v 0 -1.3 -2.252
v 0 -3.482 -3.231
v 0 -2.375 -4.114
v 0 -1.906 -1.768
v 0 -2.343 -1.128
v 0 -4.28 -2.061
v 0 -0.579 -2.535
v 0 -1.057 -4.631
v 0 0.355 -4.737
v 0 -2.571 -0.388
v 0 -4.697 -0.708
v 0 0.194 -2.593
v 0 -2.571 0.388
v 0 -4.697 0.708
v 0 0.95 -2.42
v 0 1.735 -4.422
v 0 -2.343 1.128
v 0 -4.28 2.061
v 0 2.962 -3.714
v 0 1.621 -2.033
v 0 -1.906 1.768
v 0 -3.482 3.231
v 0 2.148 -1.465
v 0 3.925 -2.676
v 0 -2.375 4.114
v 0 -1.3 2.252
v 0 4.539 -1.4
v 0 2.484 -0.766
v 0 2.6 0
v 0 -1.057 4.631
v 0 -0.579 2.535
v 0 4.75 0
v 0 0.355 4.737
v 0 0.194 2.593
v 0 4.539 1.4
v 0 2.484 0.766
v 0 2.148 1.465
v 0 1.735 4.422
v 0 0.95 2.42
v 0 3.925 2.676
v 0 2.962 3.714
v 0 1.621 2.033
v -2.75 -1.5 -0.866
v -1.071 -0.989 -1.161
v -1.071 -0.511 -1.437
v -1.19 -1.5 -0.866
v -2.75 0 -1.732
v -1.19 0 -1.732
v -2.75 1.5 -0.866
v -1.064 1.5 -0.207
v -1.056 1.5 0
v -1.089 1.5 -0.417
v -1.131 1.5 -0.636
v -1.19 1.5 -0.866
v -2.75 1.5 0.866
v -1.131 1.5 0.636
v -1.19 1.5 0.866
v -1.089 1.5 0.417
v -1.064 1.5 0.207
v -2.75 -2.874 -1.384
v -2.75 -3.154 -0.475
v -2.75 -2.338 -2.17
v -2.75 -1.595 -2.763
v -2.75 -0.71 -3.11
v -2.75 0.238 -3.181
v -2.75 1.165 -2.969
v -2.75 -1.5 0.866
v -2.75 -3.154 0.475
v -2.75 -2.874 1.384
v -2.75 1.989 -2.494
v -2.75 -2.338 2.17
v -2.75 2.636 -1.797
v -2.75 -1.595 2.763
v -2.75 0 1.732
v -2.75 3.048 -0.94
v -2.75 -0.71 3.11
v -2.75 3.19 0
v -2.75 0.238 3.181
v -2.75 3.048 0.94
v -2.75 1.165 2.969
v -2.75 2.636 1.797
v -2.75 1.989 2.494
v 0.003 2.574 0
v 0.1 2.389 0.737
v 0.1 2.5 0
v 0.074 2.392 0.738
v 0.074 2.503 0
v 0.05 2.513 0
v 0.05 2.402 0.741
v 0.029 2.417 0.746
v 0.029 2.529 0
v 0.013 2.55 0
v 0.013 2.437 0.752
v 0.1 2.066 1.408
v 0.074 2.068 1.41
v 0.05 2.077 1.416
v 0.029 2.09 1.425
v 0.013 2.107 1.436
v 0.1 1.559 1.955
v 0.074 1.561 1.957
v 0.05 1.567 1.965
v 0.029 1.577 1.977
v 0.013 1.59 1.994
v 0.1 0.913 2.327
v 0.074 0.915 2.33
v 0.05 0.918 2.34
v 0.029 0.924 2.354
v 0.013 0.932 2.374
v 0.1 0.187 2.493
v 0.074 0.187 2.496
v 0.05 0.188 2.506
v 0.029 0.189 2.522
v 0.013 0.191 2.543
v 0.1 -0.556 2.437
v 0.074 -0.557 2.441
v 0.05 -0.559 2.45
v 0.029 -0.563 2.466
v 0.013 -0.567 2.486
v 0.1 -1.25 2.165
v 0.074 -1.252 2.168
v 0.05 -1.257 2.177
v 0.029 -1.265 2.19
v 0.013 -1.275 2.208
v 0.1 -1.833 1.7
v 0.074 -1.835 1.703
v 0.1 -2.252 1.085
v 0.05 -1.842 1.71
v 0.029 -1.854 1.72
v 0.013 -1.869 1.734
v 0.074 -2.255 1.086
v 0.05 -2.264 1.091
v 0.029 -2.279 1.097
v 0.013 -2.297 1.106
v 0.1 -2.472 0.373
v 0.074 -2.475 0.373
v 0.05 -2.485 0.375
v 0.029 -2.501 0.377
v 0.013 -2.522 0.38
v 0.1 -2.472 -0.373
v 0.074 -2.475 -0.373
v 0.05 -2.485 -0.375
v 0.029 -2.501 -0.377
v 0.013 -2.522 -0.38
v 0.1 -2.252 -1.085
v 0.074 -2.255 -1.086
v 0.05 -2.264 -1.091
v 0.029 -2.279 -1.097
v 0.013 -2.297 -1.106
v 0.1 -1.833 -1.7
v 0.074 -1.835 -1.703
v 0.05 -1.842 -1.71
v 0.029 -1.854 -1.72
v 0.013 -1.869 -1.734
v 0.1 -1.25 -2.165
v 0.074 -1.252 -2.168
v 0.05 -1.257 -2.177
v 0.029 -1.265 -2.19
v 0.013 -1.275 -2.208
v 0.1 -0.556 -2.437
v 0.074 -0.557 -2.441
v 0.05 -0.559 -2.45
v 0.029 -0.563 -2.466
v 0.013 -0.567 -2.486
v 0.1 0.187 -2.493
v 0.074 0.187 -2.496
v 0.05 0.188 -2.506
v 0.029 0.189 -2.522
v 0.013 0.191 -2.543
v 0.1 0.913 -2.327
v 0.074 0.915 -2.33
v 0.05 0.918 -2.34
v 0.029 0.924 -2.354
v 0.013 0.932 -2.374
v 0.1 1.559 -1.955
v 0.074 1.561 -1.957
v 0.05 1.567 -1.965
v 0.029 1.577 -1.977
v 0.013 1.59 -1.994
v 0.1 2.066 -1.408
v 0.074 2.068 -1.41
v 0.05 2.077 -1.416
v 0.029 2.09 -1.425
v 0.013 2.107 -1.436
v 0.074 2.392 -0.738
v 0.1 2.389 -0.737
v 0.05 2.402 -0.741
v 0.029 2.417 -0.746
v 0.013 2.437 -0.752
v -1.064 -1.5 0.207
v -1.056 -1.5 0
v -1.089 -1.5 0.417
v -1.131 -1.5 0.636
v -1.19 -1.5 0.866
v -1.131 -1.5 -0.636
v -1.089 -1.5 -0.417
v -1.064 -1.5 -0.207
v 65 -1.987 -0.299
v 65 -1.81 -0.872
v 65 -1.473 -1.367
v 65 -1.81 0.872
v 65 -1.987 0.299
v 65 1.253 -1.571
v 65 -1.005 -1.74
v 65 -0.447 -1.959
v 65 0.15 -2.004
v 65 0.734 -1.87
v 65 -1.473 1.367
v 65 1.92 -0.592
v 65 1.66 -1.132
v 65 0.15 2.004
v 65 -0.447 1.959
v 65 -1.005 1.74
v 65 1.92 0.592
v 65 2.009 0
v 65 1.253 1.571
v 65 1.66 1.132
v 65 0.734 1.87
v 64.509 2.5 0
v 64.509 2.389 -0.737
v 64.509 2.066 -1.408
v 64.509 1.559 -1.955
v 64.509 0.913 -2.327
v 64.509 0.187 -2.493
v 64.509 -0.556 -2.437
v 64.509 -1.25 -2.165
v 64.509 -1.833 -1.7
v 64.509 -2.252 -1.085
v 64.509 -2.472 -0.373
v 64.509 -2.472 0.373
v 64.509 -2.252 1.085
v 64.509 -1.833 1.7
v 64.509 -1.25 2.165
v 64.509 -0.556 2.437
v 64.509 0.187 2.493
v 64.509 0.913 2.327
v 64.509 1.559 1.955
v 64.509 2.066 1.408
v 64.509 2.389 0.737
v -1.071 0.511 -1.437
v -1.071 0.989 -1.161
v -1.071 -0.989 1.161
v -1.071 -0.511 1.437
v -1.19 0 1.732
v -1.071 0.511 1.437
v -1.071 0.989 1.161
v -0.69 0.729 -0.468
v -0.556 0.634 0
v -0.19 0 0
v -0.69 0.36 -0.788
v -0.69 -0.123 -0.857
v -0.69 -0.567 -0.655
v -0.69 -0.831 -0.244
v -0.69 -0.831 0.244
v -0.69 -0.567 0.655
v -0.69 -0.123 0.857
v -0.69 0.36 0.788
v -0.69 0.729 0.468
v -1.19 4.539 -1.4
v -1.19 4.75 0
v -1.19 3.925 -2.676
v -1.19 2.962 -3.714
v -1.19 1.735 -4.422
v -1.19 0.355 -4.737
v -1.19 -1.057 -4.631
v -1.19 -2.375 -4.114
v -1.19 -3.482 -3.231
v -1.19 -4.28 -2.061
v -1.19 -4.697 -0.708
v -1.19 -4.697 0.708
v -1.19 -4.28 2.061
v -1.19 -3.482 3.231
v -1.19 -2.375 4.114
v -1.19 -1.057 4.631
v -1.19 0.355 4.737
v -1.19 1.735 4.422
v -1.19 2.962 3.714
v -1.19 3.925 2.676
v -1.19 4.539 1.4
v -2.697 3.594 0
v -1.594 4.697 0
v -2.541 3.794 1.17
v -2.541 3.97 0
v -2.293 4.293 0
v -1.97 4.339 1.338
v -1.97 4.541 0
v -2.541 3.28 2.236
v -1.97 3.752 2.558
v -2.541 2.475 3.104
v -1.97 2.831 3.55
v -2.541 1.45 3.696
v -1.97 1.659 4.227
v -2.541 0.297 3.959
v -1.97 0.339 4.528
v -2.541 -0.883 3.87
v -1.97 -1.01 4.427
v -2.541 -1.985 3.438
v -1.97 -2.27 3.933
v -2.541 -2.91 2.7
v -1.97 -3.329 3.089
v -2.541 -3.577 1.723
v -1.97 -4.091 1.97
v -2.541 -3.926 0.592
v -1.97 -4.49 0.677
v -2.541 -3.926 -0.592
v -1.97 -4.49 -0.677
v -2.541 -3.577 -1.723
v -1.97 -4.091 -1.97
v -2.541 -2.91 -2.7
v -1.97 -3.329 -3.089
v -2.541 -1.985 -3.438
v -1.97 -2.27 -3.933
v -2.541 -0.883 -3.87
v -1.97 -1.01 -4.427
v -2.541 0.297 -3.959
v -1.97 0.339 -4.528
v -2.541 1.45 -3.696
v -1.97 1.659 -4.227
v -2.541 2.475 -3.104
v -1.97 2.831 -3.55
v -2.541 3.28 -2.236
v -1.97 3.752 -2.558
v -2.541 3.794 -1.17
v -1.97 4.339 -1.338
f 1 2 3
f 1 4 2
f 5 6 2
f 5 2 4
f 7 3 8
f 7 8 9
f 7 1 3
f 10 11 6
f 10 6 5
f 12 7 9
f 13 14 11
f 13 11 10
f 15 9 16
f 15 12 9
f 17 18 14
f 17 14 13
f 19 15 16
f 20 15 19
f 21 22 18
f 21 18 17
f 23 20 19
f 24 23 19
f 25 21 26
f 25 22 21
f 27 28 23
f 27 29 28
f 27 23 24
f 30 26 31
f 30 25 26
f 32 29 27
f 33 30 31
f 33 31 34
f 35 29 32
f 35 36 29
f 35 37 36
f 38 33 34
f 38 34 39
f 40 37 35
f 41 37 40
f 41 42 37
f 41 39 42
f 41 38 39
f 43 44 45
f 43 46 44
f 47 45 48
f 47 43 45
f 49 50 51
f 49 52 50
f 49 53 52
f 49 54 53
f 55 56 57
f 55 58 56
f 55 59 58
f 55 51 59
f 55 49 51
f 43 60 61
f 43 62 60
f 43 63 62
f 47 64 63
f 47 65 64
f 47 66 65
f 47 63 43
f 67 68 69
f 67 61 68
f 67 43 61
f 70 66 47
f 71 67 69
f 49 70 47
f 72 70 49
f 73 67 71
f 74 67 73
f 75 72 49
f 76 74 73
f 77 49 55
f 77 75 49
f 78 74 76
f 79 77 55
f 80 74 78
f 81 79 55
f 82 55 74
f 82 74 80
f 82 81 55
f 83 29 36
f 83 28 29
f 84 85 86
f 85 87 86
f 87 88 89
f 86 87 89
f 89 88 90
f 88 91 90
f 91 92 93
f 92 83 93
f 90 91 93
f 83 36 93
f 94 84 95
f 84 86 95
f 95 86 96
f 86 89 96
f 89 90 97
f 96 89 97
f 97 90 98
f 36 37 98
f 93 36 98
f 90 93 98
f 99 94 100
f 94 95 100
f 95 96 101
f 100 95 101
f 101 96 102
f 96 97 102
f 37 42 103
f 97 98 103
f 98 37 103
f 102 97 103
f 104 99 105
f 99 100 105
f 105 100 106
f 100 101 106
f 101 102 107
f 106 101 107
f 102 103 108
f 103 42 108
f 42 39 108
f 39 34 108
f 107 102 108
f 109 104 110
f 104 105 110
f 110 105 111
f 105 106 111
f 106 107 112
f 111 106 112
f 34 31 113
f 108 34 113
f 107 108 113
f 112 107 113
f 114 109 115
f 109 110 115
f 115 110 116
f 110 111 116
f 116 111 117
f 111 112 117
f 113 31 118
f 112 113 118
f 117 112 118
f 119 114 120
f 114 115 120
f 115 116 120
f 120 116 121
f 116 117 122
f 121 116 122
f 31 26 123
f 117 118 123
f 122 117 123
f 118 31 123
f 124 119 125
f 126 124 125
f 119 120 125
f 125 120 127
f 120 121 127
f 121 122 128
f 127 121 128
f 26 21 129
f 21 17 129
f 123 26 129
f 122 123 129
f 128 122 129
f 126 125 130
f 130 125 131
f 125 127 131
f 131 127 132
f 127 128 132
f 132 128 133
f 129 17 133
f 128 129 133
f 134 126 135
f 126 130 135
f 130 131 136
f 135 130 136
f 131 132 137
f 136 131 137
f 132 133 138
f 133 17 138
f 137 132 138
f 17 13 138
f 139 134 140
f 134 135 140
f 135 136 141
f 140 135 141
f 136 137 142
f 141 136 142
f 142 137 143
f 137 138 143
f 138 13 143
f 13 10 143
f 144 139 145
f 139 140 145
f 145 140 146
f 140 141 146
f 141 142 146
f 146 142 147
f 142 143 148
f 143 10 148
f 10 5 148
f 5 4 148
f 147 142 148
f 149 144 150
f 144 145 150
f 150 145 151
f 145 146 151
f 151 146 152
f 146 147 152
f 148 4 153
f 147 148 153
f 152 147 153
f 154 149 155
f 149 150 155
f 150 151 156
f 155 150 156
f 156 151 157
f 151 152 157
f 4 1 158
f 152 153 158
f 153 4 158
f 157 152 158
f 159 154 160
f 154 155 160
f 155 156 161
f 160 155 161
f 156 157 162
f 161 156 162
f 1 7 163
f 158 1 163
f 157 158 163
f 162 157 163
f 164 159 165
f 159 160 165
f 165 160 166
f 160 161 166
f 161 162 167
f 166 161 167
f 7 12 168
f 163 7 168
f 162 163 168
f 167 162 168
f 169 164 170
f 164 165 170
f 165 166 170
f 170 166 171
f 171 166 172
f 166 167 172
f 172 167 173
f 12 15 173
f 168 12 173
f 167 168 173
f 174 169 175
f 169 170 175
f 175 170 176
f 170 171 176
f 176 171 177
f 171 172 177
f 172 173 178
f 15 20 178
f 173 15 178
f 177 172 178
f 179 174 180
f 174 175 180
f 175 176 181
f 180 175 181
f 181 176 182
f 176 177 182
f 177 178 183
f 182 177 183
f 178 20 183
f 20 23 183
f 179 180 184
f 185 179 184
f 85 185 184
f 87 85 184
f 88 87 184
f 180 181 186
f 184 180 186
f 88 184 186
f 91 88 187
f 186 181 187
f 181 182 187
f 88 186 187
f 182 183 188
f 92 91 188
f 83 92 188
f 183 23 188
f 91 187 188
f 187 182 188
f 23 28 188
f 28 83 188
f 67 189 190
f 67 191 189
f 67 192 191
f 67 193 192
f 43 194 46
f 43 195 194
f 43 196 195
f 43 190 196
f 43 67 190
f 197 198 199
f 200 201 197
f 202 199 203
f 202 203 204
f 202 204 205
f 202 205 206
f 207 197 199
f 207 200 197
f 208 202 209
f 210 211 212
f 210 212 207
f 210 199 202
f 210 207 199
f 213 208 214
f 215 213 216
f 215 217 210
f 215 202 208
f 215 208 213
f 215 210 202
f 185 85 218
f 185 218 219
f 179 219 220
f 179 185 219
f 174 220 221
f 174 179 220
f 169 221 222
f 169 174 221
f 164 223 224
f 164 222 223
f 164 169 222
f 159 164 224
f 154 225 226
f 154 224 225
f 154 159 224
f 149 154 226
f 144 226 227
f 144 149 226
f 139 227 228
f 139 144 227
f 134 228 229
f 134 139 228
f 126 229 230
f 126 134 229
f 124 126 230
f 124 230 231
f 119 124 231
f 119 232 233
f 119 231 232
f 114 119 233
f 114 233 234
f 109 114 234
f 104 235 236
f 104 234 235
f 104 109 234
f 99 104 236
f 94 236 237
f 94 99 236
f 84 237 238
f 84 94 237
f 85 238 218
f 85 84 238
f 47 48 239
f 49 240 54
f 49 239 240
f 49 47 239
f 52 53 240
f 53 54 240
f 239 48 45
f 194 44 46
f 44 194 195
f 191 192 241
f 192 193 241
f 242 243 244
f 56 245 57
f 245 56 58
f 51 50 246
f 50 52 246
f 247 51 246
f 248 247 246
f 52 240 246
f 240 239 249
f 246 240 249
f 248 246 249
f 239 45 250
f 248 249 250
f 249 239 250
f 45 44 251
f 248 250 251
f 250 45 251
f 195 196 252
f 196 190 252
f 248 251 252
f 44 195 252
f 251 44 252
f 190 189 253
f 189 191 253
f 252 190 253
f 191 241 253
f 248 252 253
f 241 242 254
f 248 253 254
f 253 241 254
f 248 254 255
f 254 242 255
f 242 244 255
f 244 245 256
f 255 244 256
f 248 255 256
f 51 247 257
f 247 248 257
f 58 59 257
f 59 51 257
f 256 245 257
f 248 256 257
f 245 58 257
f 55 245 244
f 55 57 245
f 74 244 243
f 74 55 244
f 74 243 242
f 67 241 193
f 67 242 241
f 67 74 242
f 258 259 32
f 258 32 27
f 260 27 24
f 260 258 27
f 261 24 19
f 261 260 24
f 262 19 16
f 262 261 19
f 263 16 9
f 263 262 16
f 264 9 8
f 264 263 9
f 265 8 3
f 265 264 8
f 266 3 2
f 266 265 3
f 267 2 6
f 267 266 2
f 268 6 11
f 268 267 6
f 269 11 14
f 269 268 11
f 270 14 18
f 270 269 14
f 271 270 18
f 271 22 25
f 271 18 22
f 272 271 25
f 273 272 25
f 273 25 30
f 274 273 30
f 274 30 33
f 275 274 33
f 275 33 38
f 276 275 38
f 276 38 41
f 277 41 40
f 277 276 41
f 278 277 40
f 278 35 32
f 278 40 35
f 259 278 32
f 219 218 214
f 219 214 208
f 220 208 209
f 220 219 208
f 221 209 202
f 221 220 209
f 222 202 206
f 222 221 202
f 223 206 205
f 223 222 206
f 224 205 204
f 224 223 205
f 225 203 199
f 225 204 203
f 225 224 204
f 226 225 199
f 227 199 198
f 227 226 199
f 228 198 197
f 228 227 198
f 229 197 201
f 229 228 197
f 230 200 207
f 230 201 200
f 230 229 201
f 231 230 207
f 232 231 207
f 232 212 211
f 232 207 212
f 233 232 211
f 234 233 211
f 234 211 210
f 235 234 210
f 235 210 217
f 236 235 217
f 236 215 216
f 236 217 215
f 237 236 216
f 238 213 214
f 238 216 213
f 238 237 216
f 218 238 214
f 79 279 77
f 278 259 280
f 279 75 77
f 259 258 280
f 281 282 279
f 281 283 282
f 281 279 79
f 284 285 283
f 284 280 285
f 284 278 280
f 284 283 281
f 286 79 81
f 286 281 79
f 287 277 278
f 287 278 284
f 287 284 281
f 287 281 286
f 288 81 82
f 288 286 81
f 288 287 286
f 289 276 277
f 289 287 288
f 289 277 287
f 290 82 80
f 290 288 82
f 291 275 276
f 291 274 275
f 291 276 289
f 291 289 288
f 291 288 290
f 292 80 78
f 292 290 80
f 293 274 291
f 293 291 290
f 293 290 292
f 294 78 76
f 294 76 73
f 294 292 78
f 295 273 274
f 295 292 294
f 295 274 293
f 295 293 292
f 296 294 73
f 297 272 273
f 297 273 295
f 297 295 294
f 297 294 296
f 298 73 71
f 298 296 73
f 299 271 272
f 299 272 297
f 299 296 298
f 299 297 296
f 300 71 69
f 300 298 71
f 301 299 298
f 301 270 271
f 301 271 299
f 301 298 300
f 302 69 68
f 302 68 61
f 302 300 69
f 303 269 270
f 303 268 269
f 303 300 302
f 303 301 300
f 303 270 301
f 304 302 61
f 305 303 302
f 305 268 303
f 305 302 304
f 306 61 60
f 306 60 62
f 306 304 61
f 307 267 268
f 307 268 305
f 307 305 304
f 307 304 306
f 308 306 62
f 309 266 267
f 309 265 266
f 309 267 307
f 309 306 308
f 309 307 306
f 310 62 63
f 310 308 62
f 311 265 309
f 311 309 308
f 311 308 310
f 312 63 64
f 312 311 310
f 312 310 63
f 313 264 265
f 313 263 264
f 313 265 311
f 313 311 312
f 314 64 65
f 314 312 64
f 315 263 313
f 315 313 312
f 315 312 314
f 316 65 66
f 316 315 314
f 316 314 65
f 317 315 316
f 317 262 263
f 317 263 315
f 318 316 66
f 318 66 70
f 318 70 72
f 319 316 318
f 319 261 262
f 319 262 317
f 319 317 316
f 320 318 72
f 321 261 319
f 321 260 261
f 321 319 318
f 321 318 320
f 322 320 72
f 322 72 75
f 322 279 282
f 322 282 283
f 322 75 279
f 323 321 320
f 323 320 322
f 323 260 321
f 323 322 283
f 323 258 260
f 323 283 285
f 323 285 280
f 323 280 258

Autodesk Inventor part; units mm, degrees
ref_plane "YZ Plane" through (0, 0, 0) normal (1, 0, 0) x (0, 1, 0)
ref_plane "XZ Plane" through (0, 0, 0) normal (0, 1, 0) x (-1, 0, 0)
sketch "Sketch1" plane through (0, 0, 0) normal (0, 0, 1) x (1, 0, 0)
  line L0 (-0.19, 0) -> (65, 0)
  line L1 (65, 0) -> (65, 2.5)
  line L2 (65, 2.5) -> (2, 2.5)
  line L3 (2, 2.5) -> (1.5091, 2.5)
  line L4 (1.5091, 2.5) -> (0, 2.5)
  line L5 (0, 2.5) -> (0, 4.75)
  line L6 (0, 4.75) -> (-2.75, 4.75)
  line L7 (-2.75, 4.75) -> (-2.75, 1.7321)
  line L8 (-2.75, 1.7321) -> (-1.19, 1.7321)
  line L9 (-1.19, 1.7321) -> (-0.19, 0)
  line L10 (-16.3, 0) -> (78.55, 0) projected
  line L11 (0, -0.95) -> (0, 5.7) projected
  line L12 (2, 2.5) -> (0, 2.5) construction
  dimension "d1" = 63
  dimension "d2" = 0.4909
  dimension "d3" = 2.75
  dimension "d4" = 1.56
  dimension "d5" = 60
  dimension "d6" = 5
  dimension "d7" = 5
  dimension "d8" = 3.4641
  dimension "d9" = 9.5
  dimension "d26" = 65
revolve "Body" add sketch "Sketch1" angle 360 about axis through (-0.19, 0, 0) along (1, 0, 0)
sketch "Sketch2" plane through (-2.75, 0, 0) normal (-1, 0, 0) x (0, 0, 1)
  circle A0 centre (0, 0) radius 1.7321 projected
  line L0 (0, -6.65) -> (0, 6.65) projected
  line L1 (-6.65, 0) -> (6.65, 0) projected
  line L2 (1.7321, 0) -> (0.866, -1.5)
  line L3 (0.866, -1.5) -> (-0.866, -1.5)
  line L4 (-0.866, -1.5) -> (-1.7321, 0)
  line L5 (-1.7321, 0) -> (-0.866, 1.5)
  line L6 (-0.866, 1.5) -> (0.866, 1.5)
  line L7 (0.866, 1.5) -> (1.7321, 0)
extrude "Slot" add sketch "Sketch2" against normal up to next contours L7 A0 | A0 L2 | L6 L0 A0 | A0 L0 L3 | L0 L6 A0 | A0 L3 L0 | L4 A0 | A0 L5
fillet "Fillet1" radius 1.56 1 edges at (-2.75, -4.75, 0)
thread "Thread" size "M5x0.8" class "6g" standard "ISO Metric profile" length 63
chamfer "Chamfer1" distance 0.4908 distance2 0.4908 1 edges at (65, -2.5, 0) measured on face at (65, 0.695, -0.3648)
ref_plane "Work Plane1" through (29, 0, 0) normal (0, -1, 0) x (1, 0, 0)
fillet "Fillet2" radius 0.1 1 edges at (0, -2.5, 0)
equation "\"d1\" = GEL"
equation "\"d3\" = KOH"
equation "\"d4\" = INTI"
equation "\"d6\" = GD"
equation "\"d7\" = BDM"
equation "\"d8\" = 1.1547 * SW"
equation "\"d9\" = KOD"
equation "\"d26\" = NLG"
equation "\"d30\" = R"
equation "\"d17\" = RR"
equation "\"d13\" = GEL"
equation "\"d15\" = -0.5 * SPD + 0.5 * GD"
equation "\"d16\" = GUL"
equation "\"GD\" = NND"
equation "\"NLG\" = 65"
equation "\"GEL\" = 63"
equation "\"KOD\" = 9.5"
equation "\"KOH\" = 2.75"
equation "\"INTI\" = 1.56"
equation "\"GAL\" = 0.61345 * PTC"
equation "\"GUL\" = 0.61345 * PTC"
equation "\"BDM\" = NND"
equation "\"SW\" = 3"
equation "\"RR\" = INTI"
equation "\"SPD\" = NND - 1.2269 * PTC"
equation "\"R\" = 0.1"
equation "\"KR\" = 5.2"
equation "\"GD1\" = THREADDIA - 1.2269 * PTC"
equation "\"THREADDIA\" = 5"
equation "\"FAWI\" = 45deg"
equation "\"PTC\" = 0.8"
equation "\"KOH1\" = 1.56"
equation "\"NND\" = 5"
equation "\"TOA\" = 30deg"
equation "\"E0\" = 1.155 * SW"
properties part number "Unbrako - M5 x 65" material "Steel, Mild"
